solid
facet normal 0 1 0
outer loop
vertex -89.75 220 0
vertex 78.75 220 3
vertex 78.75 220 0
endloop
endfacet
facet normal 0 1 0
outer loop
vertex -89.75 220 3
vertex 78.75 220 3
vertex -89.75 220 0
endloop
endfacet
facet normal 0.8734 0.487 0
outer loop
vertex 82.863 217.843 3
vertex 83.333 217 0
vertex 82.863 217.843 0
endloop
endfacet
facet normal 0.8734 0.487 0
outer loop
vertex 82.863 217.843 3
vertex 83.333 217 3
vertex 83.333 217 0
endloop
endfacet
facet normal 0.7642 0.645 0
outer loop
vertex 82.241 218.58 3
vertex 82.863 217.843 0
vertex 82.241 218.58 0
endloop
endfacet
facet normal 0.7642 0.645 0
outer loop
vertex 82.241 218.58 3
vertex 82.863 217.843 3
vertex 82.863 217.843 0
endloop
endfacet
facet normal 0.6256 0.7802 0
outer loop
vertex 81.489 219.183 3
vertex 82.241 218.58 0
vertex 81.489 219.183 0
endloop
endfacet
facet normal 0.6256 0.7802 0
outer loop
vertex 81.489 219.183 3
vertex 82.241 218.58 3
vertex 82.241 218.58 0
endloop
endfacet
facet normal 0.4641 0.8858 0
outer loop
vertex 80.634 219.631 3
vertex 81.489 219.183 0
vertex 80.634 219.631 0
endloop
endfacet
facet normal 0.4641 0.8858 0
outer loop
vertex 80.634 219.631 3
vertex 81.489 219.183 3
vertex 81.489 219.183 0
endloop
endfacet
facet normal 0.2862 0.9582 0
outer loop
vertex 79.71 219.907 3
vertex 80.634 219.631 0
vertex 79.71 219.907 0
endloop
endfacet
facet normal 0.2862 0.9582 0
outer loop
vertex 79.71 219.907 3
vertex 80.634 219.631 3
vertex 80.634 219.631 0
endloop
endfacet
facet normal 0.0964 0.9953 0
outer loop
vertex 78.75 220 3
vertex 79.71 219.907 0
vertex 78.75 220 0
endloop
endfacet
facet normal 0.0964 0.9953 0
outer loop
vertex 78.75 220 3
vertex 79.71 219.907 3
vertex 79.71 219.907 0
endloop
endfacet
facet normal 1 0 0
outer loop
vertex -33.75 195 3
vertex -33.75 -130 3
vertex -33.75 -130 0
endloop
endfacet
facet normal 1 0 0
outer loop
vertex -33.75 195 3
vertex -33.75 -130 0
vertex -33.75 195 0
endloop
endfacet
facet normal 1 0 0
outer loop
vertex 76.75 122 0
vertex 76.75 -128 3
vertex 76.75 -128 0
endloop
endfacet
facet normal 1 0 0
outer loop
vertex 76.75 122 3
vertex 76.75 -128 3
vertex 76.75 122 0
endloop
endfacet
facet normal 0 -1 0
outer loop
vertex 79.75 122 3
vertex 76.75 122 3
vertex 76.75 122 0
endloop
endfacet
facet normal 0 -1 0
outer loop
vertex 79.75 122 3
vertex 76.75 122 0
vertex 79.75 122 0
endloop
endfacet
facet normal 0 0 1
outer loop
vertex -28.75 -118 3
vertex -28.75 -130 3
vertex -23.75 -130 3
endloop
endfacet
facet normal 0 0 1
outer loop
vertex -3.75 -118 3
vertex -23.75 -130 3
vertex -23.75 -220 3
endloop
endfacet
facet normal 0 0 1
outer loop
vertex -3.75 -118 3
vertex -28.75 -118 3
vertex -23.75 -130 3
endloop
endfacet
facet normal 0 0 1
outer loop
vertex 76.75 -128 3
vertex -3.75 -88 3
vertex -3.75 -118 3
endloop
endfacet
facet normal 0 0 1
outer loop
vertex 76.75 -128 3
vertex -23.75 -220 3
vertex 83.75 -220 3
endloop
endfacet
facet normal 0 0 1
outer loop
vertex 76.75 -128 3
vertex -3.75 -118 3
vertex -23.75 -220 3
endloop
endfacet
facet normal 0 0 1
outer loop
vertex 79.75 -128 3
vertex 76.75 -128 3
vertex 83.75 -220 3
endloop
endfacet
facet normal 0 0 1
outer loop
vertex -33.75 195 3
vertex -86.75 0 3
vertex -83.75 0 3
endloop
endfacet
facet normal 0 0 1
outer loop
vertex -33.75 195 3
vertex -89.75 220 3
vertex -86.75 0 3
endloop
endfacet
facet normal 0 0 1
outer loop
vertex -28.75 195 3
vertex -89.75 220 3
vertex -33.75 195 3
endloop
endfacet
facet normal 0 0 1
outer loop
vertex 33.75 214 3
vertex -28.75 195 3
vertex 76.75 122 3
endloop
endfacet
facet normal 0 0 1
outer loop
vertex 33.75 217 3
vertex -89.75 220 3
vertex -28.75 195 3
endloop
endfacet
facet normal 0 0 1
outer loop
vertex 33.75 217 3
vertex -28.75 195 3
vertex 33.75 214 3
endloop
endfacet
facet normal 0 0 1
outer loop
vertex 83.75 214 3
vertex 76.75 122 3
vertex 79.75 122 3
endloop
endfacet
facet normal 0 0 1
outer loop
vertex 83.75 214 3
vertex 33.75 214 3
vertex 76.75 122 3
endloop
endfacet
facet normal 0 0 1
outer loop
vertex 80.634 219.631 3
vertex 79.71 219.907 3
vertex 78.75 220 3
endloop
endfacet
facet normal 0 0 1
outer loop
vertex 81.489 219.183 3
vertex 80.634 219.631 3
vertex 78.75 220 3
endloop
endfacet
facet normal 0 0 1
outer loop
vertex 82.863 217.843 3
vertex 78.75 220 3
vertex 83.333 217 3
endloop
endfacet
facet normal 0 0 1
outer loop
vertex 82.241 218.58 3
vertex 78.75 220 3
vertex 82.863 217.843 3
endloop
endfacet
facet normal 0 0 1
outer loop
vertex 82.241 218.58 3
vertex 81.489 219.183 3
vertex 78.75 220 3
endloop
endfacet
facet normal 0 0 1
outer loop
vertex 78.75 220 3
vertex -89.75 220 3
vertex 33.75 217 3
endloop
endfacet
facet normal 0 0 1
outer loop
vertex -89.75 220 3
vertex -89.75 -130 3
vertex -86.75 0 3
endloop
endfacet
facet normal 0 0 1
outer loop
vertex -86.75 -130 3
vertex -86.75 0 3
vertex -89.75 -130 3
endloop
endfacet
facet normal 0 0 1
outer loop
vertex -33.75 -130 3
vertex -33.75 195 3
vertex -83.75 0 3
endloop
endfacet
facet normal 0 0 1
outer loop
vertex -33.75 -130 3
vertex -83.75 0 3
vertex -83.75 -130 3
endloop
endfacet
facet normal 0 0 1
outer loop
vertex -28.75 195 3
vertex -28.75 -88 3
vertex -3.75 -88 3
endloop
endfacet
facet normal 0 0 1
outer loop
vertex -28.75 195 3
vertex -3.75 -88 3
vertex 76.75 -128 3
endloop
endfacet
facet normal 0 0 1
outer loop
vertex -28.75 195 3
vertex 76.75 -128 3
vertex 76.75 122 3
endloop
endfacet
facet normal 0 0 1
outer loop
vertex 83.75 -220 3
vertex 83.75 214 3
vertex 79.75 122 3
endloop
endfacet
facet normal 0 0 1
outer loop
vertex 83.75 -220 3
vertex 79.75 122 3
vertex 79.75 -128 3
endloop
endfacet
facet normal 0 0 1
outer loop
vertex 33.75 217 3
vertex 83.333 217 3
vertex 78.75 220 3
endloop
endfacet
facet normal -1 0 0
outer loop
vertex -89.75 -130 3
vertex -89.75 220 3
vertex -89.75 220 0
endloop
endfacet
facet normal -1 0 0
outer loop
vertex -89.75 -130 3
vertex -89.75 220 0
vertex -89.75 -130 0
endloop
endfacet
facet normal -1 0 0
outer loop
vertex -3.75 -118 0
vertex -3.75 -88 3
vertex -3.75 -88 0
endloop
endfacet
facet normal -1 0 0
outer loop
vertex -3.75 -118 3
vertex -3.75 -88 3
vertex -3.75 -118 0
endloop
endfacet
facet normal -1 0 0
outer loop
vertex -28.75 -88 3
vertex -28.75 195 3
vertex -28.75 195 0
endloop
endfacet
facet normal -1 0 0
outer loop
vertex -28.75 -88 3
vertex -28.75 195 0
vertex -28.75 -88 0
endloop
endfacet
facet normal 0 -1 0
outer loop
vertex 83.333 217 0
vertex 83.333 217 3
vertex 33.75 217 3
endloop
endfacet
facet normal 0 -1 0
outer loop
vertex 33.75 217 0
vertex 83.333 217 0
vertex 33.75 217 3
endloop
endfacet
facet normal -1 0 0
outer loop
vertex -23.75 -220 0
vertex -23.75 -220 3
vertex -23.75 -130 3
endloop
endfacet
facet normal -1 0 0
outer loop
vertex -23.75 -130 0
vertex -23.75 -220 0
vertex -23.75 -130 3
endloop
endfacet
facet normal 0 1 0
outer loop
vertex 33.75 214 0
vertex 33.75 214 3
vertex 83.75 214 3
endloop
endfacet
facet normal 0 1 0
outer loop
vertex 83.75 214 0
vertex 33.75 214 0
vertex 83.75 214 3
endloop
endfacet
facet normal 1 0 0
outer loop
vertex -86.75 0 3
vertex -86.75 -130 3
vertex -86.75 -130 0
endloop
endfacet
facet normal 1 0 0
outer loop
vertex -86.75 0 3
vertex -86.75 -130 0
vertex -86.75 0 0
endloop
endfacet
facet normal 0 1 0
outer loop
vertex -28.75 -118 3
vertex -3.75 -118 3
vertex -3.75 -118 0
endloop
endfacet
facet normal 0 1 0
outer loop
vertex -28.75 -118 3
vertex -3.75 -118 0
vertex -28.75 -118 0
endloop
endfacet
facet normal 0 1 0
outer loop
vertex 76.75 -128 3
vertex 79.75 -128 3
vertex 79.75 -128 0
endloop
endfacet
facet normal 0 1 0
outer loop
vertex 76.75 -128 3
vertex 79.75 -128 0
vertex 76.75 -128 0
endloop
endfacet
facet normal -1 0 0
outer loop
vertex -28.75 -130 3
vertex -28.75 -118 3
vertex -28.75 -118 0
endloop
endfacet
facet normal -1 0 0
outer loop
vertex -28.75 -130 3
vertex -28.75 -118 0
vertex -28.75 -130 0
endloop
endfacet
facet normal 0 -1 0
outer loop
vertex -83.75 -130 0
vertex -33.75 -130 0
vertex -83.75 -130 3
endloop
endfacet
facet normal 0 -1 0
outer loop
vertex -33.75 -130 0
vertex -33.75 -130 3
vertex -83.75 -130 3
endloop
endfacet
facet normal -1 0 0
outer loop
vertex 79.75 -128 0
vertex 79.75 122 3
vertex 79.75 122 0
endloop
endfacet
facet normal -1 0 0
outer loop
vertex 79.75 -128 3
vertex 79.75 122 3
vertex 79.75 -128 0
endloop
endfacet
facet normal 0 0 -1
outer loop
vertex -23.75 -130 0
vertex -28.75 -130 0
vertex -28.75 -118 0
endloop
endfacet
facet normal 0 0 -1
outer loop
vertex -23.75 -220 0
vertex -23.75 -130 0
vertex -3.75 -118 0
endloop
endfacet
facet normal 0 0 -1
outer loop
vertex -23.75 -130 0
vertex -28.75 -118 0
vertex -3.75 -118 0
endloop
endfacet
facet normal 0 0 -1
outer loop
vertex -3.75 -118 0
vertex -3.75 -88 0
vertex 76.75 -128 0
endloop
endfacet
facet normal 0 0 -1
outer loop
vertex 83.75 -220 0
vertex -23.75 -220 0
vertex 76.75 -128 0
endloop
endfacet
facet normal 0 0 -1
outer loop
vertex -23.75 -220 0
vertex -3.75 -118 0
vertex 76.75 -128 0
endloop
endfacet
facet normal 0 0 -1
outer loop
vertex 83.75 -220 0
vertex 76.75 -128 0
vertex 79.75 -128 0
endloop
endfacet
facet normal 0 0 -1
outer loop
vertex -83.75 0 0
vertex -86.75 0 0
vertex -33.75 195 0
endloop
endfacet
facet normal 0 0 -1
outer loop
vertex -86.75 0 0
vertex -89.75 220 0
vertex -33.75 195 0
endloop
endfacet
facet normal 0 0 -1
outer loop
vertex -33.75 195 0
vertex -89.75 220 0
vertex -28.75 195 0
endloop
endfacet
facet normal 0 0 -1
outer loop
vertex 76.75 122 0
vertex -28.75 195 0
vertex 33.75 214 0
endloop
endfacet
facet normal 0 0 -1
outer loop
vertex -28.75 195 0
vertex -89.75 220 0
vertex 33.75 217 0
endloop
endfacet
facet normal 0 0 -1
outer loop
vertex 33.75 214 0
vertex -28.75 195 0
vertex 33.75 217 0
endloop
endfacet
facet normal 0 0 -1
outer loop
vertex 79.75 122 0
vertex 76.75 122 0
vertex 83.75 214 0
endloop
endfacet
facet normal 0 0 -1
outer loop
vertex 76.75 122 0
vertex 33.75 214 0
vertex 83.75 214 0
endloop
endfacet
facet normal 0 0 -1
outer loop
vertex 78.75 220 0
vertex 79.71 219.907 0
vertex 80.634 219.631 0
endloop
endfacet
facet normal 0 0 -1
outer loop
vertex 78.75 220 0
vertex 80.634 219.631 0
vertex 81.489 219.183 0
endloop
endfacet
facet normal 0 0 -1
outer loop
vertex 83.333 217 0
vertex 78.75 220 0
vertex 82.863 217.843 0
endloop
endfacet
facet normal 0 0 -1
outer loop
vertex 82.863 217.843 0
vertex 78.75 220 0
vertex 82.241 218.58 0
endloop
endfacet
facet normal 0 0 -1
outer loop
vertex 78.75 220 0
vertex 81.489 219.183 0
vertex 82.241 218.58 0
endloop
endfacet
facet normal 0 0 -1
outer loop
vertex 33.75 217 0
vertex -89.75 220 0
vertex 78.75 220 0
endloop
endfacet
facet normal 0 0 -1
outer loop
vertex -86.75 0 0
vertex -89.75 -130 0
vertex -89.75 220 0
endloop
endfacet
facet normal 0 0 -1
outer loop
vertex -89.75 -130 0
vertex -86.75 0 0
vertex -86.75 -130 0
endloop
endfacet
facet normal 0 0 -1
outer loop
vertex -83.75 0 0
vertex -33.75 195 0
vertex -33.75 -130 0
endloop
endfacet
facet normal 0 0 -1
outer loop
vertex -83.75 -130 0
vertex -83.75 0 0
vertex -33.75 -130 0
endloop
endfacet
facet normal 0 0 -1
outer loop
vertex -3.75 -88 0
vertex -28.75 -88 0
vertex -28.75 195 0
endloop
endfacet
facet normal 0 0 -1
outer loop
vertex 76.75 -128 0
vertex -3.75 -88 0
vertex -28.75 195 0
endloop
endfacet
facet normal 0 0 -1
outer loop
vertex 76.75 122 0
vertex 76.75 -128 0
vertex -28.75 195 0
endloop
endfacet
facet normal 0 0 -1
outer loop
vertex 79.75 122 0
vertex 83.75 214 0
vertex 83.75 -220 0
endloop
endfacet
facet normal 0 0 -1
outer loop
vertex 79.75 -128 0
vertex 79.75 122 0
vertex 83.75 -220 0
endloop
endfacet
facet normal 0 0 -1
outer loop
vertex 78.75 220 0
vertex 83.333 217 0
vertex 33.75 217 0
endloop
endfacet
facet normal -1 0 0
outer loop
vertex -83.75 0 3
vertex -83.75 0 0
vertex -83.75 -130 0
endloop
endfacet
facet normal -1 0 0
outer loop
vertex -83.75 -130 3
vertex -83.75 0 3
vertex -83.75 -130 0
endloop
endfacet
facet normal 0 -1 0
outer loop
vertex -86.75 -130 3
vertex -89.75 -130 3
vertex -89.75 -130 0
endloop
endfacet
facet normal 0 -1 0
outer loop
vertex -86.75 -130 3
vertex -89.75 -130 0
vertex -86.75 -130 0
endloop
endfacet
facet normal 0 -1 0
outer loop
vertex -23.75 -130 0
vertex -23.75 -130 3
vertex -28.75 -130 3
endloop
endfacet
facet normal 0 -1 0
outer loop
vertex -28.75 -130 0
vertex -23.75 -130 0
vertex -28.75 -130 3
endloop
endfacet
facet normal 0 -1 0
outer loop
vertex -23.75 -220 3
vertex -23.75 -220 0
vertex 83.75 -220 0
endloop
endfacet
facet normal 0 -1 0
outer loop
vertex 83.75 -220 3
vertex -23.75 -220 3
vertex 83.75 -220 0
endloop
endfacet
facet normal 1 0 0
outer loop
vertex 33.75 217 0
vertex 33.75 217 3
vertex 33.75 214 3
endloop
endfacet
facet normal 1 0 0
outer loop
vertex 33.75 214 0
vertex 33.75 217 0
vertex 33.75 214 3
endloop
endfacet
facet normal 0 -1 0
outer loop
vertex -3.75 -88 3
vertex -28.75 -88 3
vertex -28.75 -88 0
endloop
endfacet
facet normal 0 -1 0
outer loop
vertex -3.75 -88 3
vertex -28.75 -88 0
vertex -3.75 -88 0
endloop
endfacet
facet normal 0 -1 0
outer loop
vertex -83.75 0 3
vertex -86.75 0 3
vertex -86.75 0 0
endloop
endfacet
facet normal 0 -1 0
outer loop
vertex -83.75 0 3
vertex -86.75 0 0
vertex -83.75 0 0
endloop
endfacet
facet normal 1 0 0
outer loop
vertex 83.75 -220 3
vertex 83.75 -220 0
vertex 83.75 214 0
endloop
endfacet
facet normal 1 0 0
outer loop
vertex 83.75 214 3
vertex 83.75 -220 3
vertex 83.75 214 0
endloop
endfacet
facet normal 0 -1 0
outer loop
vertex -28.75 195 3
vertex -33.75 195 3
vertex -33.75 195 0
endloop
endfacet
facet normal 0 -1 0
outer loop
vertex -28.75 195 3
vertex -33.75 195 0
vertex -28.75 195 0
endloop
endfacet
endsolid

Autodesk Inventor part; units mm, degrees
ref_plane "YZ Plane" through (0, 0, 0) normal (1, 0, 0) x (0, 1, 0)
ref_plane "XZ Plane" through (0, 0, 0) normal (0, 1, 0) x (-1, 0, 0)
ref_plane "XY Plane" through (0, 0, 0) normal (0, 0, 1) x (1, 0, 0)
sketch "Sketch8" plane through (0, 0, 3) normal (0, 0, 1) x (1, 0, 0)
  line L0 (-83.75, -130) -> (-83.75, 220)
  line L1 (-83.75, 220) -> (-89.75, 220)
  line L2 (-89.75, 220) -> (-89.75, -130)
  line L3 (-89.75, -130) -> (-83.75, -130)
  line L4 (-83.75, -130) -> (-83.75, 220)
  line L5 (-86.75, -130) -> (-86.75, 0)
  line L6 (-86.75, 0) -> (-83.75, 0)
  point P0 (0, 0)
  dimension "d35" = 6
sketch "Sketch1" plane through (0, 0, 0) normal (0, 0, 1) x (1, 0, 0)
  line L0 (-83.75, -220) -> (83.75, -220)
  line L1 (83.75, -220) -> (83.75, 220)
  line L2 (83.75, 220) -> (-83.75, 220)
  line L3 (-83.75, 220) -> (-83.75, -220)
  line L4 (-83.75, -220) -> (83.75, 220) construction
  line L5 (83.75, -220) -> (-83.75, 220) construction
  point P0 (0, 0)
  dimension "d0" = 440
  dimension "d1" = 167.5
extrude "Plate1" add sketch "Sketch1" along normal blind 3
sketch "Sketch3" plane through (0, 0, 3) normal (0, 0, 1) x (1, 0, 0)
  line L0 (-83.75, -220) -> (83.75, -220) projected
  line L1 (-83.75, -220) -> (-23.75, -220)
  line L2 (-23.75, -220) -> (-23.75, -130)
  line L3 (-23.75, -130) -> (-83.75, -130)
  line L4 (-83.75, -130) -> (-83.75, -220)
  point P0 (0, 0)
  dimension "d7" = 60
  dimension "d8" = 90
extrude "Cut2" cut sketch "Sketch3" against normal blind 3
sketch "Sketch4" plane through (0, 0, 3) normal (0, 0, 1) x (1, 0, 0)
  line L0 (-83.75, 220) -> (-83.75, -130) projected
  line L1 (-28.75, -88) -> (-3.75, -88)
  line L2 (-3.75, -88) -> (-3.75, -118)
  line L3 (-3.75, -118) -> (-83.75, -118)
  line L4 (-83.75, -118) -> (-83.75, -93)
  line L5 (-83.75, -130) -> (-23.75, -130) projected
  line L6 (-28.75, -88) -> (-28.75, -118)
  point P0 (0, 0)
  dimension "d11" = 12
  dimension "d12" = 30
  dimension "d13" = 25
  dimension "d16" = 55
extrude "Cut3" cut sketch "Sketch4" against normal blind 3
sketch "Sketch5" plane through (0, 0, 3) normal (0, 0, 1) x (1, 0, 0)
  line L0 (-33.75, 195) -> (-28.75, 195)
  line L1 (-28.75, 195) -> (-28.75, -130)
  line L2 (-28.75, -130) -> (-33.75, -130)
  line L3 (-33.75, -130) -> (-33.75, 195)
  line L4 (-83.75, 220) -> (83.75, 220) projected
  line L5 (-83.75, -130) -> (-23.75, -130) projected
  line L6 (-83.75, -130) -> (-83.75, 220) projected
  point P0 (0, 0)
  point P1 (-31.25, -130)
  dimension "d17" = 25
  dimension "d18" = 5
  dimension "d19" = 50
extrude "Cut4" cut sketch "Sketch5" against normal blind 3
fillet "Corner Round1" radius 5 1 edges at (83.75, 220, 1.5)
sketch "Sketch6" plane through (0, 0, 3) normal (0, 0, 1) x (1, 0, 0)
  line L0 (83.75, 215) -> (83.75, -220) projected
  line L1 (83.75, 217) -> (33.75, 217)
  line L2 (33.75, 217) -> (33.75, 214)
  line L3 (33.75, 214) -> (83.75, 214)
  line L4 (83.75, 214) -> (83.75, 217)
  line L5 (-83.75, 220) -> (78.75, 220) projected
  point P0 (0, 0)
  point P1 (-78.75, 220)
  dimension "d24" = 50
  dimension "d25" = 3
  dimension "d26" = 3
extrude "Cut5" cut sketch "Sketch6" against normal blind 3
sketch "Sketch7" plane through (0, 0, 3) normal (0, 0, 1) x (1, 0, 0)
  line L0 (76.75, 122) -> (79.75, 122)
  line L1 (79.75, 122) -> (79.75, -128)
  line L2 (79.75, -128) -> (76.75, -128)
  line L3 (76.75, -128) -> (76.75, 122)
  line L4 (83.75, 214) -> (83.75, -220) projected
  line L5 (83.75, -220) -> (-23.75, -220) projected
  point P0 (0, 0)
  dimension "d29" = 3
  dimension "d30" = 4
  dimension "d31" = 92
  dimension "d32" = 250
extrude "Cut6" cut sketch "Sketch7" against normal blind 3
sheet face with bend "Face2" sketch "Sketch8" thickness 3 toward (0, 0, -1) bend radius 3 contours L6 L5 L3 L2 L1 L0
bend "Bend1"
equation "\"d9\" = Thickness"
equation "\"d14\" = Thickness"
equation "\"d20\" = Thickness"
equation "\"d27\" = Thickness"
equation "\"d33\" = Thickness"
equation "\"d2\" = Thickness"
equation "\"d36\" = BendRadius"
equation "\"d37\" = BendReliefWidth"
equation "\"d39\" = MinimumRemnant"
equation "\"d38\" = BendReliefDepth"
equation "\"d40\" = TransitionRadius"
equation "\"BendRadius\" = Thickness"
equation "\"BendReliefWidth\" = Thickness"
equation "\"BendReliefDepth\" = 0.5 * Thickness"
equation "\"CornerReliefSize\" = 4 * Thickness"
equation "\"MinimumRemnant\" = 2 * Thickness"
equation "\"TransitionRadius\" = BendRadius"
equation "\"JacobiRadiusSize\" = BendRadius"
equation "\"GapSize\" = Thickness"
equation "\"Thickness\" = 3"
properties part number "Finishing Sheets .1  ( Right )"
